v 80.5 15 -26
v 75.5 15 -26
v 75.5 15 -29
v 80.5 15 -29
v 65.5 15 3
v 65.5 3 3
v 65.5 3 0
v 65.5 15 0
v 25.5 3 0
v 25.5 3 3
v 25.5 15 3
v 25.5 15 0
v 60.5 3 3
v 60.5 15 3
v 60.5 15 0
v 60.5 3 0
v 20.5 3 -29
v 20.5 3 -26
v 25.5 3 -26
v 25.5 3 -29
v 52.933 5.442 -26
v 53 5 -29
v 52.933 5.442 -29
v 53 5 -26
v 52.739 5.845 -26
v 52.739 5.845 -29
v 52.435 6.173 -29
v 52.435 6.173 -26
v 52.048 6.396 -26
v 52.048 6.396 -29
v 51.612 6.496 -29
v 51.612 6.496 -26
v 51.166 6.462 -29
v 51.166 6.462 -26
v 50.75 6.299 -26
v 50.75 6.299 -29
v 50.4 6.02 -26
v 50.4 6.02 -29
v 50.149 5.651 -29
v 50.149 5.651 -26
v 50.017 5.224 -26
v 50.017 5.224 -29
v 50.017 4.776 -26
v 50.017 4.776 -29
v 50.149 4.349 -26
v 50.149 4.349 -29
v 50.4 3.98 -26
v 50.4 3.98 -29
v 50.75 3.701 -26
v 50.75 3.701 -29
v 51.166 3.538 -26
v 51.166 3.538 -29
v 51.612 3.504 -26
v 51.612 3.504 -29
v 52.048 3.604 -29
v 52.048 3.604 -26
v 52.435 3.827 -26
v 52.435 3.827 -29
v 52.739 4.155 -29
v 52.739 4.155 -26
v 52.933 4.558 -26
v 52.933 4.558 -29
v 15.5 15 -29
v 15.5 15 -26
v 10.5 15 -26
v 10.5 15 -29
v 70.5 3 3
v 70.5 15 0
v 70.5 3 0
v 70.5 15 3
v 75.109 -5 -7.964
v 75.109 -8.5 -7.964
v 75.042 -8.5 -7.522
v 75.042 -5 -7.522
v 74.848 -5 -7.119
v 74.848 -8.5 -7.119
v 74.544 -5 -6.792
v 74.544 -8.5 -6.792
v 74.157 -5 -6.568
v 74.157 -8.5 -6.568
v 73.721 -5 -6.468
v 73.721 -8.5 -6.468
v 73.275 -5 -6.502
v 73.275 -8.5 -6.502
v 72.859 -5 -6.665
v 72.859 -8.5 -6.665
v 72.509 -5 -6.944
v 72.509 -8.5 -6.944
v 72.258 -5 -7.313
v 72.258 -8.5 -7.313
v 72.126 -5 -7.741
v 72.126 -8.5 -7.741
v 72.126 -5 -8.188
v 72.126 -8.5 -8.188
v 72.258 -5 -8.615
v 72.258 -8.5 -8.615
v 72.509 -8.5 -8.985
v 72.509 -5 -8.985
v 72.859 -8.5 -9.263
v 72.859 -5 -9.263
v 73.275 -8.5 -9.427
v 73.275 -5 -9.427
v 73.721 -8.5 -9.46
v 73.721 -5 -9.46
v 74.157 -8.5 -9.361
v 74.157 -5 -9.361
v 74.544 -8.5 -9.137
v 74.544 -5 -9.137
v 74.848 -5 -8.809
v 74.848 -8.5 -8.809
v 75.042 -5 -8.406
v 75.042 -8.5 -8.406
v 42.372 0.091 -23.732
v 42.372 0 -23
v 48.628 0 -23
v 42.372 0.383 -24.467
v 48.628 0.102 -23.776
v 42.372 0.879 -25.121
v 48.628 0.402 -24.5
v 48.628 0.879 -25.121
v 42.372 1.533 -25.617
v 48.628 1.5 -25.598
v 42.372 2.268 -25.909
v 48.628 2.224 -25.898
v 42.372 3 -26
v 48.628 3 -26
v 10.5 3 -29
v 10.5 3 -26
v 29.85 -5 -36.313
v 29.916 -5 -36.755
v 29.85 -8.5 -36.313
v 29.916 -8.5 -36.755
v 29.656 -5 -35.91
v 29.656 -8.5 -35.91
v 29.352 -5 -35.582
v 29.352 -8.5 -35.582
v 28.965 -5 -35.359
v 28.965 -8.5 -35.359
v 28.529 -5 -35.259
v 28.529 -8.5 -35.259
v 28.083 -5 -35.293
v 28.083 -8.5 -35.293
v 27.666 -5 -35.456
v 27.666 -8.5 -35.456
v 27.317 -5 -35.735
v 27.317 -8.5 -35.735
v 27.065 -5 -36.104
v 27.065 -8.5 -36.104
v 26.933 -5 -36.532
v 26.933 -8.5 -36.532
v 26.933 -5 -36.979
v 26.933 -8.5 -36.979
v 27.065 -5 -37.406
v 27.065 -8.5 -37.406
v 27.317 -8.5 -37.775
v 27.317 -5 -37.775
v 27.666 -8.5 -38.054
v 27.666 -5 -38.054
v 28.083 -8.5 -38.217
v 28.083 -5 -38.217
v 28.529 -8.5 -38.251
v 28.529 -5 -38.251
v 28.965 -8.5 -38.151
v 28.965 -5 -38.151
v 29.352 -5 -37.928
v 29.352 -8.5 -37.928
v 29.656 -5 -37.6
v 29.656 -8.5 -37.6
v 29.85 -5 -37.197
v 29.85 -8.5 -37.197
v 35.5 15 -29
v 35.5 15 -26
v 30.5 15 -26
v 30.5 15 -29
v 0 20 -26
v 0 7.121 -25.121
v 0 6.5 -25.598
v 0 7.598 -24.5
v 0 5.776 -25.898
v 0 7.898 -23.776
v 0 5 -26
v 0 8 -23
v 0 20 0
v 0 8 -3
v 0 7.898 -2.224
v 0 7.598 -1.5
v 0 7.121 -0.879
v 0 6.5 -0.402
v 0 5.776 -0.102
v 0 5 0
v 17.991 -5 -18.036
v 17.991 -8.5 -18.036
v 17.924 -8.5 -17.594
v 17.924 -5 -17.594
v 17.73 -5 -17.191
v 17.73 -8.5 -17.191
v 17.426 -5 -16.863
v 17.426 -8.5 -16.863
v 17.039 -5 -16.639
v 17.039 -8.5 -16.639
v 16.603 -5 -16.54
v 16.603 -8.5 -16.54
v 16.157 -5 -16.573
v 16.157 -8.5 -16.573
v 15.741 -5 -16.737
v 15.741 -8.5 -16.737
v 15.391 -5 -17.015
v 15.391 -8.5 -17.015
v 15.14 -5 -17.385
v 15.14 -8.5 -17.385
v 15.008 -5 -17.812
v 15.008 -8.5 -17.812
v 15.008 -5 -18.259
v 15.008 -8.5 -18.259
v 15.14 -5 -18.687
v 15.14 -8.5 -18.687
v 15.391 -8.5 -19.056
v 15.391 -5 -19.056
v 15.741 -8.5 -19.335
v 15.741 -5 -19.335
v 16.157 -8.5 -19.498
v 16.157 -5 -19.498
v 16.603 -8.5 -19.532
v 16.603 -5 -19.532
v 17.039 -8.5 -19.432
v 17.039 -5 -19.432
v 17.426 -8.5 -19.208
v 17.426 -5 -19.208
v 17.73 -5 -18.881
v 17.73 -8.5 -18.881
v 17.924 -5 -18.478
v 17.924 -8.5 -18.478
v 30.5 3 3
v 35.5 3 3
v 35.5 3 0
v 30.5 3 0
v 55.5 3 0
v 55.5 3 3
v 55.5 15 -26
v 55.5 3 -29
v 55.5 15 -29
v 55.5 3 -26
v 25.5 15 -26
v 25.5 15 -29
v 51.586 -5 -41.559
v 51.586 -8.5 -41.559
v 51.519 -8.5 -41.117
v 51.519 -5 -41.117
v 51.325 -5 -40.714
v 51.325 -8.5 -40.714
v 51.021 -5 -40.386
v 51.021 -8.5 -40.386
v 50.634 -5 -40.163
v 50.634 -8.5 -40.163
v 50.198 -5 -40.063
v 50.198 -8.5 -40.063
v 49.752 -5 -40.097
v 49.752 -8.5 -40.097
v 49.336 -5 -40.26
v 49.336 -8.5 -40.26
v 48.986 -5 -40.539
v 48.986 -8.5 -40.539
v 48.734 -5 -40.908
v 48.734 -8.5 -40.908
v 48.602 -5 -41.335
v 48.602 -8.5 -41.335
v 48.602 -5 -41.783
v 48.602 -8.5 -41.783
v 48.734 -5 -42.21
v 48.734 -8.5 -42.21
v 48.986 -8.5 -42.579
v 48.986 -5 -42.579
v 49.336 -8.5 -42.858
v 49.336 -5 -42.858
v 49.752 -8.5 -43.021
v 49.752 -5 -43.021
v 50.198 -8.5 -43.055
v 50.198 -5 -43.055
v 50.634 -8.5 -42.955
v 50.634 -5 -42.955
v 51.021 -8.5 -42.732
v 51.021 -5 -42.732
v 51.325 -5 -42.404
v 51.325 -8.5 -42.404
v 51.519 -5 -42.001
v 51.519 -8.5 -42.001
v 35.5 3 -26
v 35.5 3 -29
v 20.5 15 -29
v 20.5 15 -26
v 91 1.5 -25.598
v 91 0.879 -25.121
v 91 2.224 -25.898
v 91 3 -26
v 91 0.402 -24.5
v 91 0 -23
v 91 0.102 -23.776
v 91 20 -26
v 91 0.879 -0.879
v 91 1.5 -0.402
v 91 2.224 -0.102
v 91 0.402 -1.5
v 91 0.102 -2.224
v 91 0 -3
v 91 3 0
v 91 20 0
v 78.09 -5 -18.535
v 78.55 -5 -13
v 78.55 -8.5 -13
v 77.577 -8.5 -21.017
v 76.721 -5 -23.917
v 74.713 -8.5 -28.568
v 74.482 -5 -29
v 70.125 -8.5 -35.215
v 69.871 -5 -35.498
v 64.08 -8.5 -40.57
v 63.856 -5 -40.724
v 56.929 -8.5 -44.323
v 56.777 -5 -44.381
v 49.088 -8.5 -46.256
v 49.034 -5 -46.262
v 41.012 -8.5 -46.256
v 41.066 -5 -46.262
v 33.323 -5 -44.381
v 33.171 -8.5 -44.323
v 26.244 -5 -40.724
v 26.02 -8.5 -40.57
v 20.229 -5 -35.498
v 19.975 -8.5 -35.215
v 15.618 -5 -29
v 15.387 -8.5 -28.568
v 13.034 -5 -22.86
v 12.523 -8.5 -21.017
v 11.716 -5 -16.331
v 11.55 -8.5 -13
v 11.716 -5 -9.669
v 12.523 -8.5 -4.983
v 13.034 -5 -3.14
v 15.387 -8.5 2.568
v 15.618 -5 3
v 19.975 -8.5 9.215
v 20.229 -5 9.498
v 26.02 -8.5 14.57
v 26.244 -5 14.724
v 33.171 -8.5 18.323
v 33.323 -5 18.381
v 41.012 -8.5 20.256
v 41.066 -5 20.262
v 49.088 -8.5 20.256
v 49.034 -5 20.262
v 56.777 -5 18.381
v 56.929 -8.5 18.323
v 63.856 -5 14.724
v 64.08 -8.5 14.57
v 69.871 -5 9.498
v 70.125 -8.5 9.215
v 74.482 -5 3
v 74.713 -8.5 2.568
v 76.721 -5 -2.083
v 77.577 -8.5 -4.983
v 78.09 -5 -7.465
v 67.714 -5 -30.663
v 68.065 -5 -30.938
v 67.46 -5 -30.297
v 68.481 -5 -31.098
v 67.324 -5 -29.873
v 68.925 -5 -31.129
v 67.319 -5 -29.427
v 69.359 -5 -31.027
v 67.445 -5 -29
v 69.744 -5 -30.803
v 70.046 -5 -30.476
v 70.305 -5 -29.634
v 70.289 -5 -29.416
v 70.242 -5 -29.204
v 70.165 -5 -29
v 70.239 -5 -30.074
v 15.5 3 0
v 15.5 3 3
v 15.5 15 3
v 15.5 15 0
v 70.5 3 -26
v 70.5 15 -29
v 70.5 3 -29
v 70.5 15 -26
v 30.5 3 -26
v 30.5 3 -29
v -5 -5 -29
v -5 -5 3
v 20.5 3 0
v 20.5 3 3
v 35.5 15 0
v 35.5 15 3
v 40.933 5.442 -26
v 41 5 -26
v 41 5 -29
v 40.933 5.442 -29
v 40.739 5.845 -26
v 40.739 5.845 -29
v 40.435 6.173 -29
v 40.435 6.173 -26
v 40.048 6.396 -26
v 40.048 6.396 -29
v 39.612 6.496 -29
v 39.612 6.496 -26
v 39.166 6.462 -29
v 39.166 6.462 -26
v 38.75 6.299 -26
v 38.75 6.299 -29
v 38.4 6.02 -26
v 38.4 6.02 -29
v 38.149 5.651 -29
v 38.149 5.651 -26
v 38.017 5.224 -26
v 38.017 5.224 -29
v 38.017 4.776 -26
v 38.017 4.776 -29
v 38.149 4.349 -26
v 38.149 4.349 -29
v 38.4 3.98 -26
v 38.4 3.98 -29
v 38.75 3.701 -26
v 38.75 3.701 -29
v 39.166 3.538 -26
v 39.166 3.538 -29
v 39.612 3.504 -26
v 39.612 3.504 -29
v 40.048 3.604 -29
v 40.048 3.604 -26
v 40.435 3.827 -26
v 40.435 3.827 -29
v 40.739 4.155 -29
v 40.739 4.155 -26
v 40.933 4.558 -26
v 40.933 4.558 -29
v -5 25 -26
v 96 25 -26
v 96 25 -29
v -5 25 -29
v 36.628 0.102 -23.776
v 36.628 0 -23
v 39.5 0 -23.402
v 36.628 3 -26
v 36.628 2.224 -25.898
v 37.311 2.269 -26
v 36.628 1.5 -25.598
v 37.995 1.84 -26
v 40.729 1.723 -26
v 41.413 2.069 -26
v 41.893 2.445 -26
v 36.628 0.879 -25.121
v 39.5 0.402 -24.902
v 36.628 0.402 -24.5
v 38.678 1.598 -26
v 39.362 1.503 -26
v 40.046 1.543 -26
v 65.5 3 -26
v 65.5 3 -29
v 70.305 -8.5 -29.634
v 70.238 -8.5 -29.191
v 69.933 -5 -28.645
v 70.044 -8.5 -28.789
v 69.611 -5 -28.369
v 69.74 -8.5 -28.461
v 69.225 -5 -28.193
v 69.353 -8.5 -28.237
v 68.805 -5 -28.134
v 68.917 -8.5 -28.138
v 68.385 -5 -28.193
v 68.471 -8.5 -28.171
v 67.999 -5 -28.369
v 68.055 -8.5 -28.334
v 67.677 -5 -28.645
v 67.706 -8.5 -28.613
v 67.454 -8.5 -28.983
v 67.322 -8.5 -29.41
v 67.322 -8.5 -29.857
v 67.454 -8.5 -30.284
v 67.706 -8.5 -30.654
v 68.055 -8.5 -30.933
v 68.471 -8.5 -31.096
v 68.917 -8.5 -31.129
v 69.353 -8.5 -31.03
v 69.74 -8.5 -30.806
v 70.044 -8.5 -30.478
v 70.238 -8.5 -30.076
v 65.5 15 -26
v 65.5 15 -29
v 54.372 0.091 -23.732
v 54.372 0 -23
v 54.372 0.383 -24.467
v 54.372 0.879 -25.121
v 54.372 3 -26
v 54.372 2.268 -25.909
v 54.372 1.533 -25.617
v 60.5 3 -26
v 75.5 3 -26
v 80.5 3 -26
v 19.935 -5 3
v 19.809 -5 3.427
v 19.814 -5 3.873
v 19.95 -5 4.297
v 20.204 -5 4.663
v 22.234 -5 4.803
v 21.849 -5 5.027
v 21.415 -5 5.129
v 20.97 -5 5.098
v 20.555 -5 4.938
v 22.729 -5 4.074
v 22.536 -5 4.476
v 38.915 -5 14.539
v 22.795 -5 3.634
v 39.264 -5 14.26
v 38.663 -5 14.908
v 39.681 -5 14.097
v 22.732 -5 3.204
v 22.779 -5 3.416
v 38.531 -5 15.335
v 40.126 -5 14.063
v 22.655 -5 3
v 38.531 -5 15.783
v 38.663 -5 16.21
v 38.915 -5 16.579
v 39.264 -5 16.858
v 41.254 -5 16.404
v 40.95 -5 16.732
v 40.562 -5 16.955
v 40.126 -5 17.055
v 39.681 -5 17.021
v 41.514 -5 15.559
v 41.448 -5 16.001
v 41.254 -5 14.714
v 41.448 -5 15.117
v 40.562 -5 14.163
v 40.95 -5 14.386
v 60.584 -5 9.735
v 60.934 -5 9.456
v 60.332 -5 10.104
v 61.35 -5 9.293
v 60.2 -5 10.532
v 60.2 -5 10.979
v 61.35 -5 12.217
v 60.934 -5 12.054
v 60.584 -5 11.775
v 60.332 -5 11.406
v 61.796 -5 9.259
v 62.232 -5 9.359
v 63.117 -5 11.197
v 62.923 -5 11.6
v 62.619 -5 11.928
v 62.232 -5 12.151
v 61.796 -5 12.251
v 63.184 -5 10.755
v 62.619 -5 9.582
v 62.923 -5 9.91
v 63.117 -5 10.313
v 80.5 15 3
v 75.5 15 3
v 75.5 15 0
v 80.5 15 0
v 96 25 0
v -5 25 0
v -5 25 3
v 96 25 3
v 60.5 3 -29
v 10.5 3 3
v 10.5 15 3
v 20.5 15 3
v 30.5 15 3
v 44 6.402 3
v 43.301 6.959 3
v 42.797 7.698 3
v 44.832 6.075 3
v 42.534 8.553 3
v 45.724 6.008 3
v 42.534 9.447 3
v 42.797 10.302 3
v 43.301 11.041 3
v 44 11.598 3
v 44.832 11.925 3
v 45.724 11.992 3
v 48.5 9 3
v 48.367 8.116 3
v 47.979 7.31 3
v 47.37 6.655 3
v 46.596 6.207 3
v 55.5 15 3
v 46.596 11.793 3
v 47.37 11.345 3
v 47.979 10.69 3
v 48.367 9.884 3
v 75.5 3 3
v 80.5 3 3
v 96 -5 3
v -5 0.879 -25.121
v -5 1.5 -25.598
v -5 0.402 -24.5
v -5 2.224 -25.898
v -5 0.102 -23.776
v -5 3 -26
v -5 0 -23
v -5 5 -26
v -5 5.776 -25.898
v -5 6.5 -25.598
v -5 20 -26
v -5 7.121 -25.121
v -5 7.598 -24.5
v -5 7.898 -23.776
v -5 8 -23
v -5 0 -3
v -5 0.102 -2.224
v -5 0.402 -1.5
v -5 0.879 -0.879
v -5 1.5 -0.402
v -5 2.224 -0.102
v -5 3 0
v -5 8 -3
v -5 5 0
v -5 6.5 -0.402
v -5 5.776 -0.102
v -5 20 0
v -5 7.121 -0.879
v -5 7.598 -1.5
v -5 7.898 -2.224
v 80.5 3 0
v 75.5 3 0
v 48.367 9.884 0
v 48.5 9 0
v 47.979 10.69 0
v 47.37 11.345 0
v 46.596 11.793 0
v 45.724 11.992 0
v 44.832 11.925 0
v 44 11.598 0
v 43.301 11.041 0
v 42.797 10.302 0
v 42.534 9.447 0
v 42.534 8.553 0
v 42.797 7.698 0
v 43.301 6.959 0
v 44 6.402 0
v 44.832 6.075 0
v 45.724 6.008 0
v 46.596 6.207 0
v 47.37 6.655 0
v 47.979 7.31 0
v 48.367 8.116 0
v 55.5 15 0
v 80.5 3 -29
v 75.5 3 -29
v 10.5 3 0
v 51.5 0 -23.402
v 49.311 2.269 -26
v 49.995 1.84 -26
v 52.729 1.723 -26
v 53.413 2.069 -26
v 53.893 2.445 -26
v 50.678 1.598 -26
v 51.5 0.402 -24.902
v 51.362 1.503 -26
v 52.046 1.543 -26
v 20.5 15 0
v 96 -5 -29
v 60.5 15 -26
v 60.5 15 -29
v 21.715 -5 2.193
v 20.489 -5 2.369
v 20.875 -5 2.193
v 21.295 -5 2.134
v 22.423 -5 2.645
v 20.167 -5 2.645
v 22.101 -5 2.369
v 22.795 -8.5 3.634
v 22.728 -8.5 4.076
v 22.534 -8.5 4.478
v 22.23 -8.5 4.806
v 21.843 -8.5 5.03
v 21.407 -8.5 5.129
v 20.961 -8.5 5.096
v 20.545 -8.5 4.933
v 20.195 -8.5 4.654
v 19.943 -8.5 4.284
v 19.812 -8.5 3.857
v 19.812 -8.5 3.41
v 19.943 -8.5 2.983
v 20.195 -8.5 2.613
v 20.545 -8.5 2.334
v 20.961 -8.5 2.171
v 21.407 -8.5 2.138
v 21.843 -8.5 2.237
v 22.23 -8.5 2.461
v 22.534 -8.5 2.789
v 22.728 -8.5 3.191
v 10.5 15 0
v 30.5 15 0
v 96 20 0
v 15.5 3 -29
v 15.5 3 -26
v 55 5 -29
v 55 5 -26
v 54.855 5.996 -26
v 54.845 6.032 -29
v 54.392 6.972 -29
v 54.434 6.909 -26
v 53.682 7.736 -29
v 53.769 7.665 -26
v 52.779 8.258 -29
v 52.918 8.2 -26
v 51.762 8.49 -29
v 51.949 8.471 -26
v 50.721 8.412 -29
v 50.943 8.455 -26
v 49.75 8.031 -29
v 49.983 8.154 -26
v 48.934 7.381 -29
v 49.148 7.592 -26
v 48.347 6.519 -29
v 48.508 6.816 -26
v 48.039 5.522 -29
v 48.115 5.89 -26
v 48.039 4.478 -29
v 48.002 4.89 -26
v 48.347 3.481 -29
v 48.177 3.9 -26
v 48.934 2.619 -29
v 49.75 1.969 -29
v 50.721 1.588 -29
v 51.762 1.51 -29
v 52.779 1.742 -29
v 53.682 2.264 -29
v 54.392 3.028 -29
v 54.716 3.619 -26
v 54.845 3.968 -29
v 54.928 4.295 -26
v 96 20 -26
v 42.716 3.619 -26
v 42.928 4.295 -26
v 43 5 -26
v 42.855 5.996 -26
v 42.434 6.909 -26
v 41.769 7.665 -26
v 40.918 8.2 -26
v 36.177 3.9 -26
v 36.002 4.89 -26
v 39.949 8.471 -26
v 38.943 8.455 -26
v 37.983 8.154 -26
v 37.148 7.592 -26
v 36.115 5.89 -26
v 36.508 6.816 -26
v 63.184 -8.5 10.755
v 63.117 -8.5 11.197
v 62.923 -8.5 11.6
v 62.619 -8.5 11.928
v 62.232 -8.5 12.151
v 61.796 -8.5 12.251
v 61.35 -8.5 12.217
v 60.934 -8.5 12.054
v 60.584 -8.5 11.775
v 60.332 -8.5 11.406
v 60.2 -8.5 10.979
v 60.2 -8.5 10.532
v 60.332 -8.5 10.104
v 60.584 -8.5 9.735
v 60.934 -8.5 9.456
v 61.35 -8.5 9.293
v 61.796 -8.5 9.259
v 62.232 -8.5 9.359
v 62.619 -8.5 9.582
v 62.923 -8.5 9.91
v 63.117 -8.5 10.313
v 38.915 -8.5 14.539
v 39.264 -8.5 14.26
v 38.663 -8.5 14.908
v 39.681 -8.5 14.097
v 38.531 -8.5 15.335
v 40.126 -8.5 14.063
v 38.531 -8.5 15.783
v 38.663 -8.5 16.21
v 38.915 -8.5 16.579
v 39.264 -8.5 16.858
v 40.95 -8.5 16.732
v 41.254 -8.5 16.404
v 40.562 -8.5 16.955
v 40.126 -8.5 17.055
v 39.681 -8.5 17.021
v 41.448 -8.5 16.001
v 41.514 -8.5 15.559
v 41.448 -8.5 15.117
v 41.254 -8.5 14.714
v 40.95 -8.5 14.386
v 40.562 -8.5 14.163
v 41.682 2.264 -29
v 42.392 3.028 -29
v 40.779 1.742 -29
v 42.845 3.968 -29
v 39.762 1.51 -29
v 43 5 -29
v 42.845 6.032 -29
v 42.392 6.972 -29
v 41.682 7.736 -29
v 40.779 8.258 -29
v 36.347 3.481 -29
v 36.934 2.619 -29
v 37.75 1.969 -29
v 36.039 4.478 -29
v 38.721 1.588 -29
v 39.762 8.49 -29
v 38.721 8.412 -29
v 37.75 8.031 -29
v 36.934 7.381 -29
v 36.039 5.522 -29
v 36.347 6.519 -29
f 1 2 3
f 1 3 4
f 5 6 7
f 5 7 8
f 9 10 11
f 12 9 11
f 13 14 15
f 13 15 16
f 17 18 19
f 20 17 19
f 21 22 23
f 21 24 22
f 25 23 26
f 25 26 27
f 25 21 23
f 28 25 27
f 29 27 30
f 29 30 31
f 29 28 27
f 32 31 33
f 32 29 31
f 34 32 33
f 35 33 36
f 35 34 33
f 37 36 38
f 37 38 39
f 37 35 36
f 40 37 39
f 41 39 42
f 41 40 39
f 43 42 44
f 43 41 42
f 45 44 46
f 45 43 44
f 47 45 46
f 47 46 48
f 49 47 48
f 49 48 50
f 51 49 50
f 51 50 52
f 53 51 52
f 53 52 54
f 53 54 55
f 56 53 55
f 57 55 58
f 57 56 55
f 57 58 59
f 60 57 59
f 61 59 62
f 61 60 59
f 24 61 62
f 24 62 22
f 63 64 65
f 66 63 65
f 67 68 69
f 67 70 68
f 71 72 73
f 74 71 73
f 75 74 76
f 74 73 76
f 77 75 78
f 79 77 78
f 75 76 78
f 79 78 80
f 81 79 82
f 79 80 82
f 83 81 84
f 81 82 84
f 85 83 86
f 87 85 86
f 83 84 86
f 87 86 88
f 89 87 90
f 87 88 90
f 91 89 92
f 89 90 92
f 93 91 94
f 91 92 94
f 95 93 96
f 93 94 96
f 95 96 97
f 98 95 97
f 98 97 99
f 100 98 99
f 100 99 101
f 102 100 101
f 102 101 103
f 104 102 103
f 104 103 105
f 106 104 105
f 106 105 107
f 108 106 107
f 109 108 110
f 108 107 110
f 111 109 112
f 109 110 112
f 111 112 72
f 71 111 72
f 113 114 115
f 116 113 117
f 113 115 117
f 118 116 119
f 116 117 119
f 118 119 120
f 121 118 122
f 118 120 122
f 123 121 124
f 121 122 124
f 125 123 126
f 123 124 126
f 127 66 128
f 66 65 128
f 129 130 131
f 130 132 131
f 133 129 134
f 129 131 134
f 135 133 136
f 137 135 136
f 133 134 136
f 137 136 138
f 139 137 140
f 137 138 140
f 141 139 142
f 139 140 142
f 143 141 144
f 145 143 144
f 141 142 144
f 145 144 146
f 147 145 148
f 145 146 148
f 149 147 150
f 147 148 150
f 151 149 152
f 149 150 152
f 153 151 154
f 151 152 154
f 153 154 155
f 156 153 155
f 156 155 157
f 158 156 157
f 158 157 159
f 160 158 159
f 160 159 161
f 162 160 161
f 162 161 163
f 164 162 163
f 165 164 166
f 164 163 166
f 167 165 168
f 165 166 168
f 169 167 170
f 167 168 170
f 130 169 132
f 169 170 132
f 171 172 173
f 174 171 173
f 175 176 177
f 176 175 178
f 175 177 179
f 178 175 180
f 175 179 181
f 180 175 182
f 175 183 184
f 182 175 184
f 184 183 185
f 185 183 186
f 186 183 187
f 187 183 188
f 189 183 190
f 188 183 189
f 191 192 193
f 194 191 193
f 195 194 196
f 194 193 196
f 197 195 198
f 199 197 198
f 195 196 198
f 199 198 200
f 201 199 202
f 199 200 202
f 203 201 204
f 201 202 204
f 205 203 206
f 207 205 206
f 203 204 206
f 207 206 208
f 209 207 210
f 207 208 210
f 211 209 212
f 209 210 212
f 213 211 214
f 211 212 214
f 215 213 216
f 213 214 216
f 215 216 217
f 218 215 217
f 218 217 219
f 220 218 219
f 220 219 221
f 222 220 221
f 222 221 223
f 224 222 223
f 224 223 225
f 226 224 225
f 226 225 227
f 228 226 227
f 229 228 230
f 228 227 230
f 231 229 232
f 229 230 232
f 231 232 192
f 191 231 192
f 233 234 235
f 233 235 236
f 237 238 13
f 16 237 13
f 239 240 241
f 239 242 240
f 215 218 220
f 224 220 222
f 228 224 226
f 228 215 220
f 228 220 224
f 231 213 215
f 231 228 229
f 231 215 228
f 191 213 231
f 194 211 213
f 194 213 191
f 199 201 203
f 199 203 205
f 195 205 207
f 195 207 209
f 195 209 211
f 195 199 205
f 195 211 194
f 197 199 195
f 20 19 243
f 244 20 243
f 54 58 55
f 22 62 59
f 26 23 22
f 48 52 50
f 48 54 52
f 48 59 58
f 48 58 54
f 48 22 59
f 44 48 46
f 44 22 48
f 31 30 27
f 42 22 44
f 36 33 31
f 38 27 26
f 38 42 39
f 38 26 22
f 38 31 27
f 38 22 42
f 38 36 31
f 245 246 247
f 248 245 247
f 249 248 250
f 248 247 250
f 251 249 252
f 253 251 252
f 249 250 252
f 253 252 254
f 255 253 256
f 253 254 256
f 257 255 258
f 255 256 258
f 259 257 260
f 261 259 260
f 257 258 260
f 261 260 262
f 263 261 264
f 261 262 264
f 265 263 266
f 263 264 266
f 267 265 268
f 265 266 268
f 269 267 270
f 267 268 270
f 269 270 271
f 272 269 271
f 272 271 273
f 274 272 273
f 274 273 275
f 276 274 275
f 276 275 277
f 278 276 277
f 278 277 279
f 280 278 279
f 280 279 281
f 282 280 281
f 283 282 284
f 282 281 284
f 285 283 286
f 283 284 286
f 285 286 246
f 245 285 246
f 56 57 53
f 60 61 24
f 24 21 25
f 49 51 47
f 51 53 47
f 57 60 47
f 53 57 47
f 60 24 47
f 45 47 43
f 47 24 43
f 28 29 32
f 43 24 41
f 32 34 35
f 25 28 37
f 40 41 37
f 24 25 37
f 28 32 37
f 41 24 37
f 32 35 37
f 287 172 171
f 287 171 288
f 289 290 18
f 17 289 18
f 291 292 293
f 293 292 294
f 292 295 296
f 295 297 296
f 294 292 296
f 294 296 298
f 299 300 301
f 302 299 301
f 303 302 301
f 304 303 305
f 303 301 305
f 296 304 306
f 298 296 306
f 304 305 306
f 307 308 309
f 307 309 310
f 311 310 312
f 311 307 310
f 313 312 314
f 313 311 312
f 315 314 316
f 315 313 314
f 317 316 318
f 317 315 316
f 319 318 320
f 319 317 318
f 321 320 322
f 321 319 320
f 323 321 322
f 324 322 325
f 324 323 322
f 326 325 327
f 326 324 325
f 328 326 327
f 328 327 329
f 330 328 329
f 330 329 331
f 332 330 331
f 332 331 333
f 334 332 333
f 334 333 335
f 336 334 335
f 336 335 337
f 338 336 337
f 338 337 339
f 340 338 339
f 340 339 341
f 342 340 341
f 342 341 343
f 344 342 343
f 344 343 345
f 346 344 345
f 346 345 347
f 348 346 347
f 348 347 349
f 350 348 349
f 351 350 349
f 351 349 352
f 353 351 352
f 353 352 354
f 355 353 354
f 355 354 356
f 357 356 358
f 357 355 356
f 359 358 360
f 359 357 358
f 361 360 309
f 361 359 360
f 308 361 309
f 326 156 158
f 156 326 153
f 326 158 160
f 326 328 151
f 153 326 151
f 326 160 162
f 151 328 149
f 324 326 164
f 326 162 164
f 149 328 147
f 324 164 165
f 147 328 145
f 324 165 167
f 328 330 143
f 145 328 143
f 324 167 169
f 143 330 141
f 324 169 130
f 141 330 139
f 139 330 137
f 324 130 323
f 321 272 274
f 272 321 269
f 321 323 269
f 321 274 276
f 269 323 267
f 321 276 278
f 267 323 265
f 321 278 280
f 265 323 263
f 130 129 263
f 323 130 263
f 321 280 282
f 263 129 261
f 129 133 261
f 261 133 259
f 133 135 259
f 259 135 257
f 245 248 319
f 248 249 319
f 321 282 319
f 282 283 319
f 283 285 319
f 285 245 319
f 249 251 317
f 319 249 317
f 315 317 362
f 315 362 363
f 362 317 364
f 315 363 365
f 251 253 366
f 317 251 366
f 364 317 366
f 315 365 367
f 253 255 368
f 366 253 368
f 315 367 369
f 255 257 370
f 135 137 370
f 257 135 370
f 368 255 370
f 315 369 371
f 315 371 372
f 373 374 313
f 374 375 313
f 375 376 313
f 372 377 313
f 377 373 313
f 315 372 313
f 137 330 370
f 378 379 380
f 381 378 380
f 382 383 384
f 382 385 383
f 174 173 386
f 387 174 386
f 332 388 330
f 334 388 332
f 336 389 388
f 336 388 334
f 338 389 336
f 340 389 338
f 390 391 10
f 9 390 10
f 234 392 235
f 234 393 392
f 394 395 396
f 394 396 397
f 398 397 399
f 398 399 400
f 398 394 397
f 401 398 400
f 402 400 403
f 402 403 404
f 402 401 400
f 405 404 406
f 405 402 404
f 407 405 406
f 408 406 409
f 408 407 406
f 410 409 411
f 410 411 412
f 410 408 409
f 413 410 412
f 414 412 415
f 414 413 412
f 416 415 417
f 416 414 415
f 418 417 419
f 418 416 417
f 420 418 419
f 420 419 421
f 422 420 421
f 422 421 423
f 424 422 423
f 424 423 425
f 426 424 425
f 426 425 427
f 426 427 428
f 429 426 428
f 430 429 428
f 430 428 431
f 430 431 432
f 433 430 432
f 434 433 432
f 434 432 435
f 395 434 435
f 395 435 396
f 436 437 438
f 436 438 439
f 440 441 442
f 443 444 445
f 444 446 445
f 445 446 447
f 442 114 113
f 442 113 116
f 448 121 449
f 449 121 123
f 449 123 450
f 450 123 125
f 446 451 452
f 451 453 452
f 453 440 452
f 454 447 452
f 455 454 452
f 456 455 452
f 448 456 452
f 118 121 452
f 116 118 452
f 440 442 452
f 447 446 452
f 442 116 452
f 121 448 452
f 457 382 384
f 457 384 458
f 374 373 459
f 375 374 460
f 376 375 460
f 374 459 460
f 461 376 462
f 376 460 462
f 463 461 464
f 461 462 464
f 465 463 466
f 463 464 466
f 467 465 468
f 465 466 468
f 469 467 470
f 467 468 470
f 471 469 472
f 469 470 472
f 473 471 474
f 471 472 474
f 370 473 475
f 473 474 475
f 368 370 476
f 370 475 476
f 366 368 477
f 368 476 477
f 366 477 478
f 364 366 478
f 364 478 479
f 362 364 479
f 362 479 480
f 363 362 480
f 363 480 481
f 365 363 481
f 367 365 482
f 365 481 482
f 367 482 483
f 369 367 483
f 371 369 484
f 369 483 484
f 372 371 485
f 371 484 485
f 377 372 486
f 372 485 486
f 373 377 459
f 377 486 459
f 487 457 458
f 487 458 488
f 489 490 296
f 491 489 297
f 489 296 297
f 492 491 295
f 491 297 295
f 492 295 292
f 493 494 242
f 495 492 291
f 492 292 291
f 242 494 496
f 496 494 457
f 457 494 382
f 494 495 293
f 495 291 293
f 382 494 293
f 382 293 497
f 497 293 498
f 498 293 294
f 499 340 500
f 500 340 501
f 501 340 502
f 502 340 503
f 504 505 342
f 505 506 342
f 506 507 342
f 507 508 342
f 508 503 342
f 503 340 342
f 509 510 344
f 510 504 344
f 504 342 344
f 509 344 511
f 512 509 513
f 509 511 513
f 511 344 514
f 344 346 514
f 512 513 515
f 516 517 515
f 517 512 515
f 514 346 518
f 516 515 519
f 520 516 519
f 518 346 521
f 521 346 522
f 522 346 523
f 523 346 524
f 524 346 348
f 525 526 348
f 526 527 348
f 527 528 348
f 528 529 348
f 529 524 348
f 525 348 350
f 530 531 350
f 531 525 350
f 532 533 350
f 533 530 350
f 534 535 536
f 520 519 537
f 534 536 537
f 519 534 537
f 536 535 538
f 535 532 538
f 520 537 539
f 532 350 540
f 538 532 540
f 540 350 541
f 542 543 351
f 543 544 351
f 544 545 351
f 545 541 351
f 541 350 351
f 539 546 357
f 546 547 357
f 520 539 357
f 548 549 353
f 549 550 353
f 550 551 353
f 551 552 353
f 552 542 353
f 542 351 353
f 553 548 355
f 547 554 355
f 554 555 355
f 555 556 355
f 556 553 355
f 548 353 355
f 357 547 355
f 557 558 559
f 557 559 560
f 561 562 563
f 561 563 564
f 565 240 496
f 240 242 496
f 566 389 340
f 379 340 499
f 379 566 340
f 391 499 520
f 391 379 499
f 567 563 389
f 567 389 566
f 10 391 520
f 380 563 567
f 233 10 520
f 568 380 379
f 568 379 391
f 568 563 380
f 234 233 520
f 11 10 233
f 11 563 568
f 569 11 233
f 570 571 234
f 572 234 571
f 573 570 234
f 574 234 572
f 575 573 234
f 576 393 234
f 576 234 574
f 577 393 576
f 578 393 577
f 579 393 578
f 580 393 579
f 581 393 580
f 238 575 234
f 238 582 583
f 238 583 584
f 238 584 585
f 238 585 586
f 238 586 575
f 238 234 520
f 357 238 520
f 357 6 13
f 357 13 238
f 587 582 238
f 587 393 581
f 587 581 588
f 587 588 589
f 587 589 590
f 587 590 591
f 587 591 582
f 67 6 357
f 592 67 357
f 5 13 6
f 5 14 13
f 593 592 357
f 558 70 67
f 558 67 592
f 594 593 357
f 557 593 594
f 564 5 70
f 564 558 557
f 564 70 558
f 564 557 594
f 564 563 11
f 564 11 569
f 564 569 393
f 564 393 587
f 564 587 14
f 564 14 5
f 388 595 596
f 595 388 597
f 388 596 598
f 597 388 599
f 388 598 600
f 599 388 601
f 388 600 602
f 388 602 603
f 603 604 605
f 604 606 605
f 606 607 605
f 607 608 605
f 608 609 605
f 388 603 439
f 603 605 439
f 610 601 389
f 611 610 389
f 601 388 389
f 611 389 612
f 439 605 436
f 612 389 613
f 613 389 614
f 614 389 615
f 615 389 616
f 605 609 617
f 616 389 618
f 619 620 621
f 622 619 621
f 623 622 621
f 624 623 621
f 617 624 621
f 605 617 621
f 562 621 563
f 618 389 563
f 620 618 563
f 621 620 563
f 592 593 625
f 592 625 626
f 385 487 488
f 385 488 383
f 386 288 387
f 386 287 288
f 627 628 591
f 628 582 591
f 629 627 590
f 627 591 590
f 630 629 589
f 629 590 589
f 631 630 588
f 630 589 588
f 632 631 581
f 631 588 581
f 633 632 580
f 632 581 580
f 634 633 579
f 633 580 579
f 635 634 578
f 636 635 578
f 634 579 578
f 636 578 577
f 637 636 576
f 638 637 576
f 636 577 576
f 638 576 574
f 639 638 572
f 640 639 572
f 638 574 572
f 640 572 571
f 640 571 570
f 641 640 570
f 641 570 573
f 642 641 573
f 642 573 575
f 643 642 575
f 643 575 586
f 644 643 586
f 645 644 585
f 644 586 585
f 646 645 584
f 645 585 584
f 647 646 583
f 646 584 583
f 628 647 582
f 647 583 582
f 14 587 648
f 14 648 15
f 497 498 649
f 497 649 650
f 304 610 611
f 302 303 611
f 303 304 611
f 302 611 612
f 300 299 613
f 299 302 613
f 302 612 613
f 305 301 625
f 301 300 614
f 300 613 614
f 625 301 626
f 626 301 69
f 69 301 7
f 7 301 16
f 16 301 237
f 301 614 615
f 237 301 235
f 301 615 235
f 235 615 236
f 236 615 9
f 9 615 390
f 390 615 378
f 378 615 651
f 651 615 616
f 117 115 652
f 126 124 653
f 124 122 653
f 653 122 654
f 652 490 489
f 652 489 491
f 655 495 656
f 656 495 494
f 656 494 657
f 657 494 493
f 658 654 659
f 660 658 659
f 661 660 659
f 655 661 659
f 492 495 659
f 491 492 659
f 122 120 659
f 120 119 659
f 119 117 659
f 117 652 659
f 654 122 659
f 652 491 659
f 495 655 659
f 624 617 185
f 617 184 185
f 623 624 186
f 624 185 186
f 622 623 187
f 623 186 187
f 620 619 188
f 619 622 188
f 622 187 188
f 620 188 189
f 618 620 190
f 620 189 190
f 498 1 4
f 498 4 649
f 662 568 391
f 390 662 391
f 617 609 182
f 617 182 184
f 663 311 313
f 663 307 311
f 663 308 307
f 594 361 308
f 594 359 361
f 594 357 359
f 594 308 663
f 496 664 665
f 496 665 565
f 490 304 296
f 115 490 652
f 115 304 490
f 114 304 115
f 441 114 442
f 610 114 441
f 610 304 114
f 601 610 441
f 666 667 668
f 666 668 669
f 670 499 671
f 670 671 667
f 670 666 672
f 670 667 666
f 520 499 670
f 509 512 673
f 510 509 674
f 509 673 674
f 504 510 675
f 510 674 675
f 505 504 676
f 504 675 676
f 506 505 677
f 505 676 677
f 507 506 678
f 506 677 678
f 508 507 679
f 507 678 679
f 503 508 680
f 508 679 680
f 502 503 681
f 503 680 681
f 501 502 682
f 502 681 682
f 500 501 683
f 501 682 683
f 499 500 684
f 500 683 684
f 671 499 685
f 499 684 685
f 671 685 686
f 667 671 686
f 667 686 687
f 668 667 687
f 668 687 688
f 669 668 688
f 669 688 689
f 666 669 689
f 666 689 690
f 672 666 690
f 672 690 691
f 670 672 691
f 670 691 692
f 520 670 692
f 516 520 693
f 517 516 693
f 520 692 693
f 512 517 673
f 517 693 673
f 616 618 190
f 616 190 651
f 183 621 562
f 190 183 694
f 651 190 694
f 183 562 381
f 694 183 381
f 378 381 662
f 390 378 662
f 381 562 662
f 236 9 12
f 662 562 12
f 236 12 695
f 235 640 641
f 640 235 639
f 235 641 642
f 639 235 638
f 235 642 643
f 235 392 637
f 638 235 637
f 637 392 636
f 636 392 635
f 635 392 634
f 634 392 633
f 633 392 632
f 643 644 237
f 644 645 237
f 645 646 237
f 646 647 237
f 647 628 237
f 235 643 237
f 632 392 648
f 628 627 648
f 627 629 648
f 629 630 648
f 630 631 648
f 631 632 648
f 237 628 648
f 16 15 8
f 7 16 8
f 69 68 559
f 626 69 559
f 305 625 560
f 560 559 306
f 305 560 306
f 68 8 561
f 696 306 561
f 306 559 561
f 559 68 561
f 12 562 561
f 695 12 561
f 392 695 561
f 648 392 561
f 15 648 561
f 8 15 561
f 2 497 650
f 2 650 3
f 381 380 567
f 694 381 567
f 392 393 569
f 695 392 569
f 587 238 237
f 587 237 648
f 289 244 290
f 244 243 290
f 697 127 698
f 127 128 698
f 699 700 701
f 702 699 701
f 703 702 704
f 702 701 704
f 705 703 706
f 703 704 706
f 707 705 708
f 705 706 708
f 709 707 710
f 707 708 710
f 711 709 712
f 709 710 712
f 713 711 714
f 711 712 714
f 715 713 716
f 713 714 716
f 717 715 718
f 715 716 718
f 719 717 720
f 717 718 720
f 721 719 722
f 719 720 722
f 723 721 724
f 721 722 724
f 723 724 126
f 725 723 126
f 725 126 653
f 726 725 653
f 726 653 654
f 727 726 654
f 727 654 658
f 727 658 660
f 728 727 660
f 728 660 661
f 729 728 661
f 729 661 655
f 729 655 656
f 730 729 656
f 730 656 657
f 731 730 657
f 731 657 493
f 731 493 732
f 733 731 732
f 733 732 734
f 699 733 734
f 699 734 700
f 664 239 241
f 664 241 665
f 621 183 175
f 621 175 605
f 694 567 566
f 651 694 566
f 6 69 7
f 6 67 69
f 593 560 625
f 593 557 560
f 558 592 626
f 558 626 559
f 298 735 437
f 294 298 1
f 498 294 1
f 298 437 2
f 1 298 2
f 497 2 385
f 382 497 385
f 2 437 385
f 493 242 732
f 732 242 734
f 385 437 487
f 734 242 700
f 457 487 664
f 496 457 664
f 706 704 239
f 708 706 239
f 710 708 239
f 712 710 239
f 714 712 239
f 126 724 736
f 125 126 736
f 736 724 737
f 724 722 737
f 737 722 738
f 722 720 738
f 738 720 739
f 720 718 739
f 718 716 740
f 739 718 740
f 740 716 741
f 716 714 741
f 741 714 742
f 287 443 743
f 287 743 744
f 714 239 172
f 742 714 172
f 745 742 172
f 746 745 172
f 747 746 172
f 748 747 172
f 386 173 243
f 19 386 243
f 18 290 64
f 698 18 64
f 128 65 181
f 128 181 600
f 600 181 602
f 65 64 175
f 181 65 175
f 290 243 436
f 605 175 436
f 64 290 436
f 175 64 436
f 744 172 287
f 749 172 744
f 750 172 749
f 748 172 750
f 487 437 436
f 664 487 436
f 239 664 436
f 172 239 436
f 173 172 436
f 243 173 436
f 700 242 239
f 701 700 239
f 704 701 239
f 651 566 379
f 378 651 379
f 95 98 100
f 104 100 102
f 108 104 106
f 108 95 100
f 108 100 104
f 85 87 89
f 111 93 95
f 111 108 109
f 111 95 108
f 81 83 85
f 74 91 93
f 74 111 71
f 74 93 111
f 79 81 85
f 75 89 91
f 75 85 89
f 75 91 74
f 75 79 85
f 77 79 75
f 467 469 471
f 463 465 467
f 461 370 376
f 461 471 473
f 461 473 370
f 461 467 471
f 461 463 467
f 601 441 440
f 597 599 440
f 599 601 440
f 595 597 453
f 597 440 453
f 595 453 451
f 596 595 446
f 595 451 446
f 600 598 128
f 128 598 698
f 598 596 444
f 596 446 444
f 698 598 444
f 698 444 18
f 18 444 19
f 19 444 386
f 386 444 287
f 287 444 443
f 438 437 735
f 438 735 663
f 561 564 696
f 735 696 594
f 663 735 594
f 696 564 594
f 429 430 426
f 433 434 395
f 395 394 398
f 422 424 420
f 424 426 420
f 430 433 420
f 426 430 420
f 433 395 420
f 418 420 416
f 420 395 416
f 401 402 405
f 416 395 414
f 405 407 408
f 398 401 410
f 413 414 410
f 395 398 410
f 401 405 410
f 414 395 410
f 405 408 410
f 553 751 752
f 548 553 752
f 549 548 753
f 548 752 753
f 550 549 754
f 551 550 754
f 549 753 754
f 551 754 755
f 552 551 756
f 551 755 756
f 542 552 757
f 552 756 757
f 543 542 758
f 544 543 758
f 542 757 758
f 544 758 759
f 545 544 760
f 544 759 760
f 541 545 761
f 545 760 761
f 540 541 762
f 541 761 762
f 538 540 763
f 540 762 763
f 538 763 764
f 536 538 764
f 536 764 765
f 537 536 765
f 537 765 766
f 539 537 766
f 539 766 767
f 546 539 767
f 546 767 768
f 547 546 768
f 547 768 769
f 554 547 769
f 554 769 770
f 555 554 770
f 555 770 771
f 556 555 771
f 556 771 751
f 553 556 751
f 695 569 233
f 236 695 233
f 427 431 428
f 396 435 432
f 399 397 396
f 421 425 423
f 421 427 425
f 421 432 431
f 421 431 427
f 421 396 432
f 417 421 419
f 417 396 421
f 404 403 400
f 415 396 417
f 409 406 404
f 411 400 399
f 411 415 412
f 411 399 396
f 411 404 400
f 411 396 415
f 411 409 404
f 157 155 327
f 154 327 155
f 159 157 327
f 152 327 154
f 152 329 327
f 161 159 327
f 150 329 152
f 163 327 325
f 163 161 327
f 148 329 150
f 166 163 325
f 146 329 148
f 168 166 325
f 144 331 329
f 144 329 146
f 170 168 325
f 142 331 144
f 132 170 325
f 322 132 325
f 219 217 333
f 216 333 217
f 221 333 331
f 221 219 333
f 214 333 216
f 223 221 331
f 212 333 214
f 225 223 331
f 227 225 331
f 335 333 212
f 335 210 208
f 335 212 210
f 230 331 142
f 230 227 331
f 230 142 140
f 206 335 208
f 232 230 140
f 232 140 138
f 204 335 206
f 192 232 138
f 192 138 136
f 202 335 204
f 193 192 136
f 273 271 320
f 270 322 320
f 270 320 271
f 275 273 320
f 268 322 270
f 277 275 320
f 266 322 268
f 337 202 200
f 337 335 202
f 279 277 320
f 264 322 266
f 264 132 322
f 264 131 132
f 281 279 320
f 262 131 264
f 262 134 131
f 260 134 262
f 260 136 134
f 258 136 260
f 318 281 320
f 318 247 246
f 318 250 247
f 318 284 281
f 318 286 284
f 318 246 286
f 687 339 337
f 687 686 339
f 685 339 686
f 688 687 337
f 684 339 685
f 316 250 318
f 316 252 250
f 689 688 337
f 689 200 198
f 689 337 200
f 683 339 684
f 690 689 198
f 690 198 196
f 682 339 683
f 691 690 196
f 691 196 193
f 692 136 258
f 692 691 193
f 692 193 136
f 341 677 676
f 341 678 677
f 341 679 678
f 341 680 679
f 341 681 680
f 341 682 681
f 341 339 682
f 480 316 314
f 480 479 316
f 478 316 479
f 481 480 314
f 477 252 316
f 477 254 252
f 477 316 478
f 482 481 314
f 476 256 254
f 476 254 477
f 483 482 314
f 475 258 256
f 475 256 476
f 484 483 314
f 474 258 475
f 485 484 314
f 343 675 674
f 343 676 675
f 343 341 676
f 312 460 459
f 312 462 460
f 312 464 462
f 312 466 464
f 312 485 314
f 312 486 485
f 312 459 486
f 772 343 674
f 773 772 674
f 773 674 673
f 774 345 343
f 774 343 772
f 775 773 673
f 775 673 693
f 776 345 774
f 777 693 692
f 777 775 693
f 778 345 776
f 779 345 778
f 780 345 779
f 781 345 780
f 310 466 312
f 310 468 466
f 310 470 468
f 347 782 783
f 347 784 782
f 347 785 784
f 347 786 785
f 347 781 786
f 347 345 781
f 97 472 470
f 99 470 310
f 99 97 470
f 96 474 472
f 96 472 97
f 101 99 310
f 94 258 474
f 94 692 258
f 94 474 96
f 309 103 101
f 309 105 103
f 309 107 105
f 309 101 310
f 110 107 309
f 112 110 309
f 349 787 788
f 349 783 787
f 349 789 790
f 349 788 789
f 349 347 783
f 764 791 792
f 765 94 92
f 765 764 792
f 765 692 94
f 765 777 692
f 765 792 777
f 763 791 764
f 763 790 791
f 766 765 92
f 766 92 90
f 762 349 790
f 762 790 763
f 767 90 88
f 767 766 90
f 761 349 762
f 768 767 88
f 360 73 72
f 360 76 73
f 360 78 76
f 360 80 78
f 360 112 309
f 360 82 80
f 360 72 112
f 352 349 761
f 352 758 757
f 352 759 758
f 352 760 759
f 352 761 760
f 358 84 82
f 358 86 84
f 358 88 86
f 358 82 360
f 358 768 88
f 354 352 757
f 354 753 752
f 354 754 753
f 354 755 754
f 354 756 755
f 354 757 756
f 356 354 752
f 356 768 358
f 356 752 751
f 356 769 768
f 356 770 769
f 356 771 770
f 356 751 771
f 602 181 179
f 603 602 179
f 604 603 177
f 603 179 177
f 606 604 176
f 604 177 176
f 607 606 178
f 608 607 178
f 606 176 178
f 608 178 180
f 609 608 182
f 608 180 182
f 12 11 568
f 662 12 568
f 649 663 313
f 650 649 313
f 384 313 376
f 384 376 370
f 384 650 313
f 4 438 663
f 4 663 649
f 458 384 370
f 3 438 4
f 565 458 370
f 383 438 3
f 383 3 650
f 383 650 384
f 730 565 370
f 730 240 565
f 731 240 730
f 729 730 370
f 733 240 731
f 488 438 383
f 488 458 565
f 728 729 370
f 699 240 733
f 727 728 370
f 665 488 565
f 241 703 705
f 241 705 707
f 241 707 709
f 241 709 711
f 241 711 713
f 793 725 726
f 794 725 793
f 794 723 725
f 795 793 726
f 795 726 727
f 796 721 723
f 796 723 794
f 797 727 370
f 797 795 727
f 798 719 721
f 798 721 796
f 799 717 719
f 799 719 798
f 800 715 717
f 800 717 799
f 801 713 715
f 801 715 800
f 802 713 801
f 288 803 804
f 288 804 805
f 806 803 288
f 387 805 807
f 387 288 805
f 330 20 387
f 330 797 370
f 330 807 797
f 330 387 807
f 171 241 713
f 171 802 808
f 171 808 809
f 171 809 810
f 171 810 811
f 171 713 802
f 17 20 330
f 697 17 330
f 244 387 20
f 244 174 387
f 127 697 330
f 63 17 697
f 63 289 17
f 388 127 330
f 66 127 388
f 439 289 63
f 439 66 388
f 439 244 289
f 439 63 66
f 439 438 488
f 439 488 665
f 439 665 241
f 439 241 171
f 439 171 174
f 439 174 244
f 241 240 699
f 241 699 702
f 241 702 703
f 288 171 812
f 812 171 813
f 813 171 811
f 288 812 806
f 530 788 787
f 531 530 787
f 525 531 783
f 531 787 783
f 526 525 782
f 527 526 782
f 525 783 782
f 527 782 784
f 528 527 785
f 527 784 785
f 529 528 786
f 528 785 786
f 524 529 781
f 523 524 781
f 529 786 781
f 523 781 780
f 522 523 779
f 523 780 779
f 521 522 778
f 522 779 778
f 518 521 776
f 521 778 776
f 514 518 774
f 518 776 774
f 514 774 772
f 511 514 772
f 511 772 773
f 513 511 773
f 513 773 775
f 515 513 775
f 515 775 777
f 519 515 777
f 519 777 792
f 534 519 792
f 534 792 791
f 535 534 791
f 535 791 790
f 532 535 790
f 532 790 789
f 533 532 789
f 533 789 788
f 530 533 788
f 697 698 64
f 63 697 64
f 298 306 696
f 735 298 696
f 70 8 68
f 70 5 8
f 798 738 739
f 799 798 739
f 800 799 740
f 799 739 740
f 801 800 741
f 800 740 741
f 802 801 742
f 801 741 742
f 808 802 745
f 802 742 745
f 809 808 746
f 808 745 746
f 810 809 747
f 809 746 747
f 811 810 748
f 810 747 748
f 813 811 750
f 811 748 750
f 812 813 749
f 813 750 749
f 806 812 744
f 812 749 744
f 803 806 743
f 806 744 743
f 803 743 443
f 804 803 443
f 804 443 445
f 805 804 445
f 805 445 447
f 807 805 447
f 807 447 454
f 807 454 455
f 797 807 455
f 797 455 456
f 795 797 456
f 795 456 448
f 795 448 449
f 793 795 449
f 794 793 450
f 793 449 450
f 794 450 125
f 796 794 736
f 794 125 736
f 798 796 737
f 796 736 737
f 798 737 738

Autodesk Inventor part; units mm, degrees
ref_plane "YZ Plane" through (0, 0, 0) normal (1, 0, 0) x (0, 1, 0)
ref_plane "XZ Plane" through (0, 0, 0) normal (0, 1, 0) x (-1, 0, 0)
ref_plane "XY Plane" through (0, 0, 0) normal (0, 0, 1) x (1, 0, 0)
sketch "Sketch1" plane through (0, 0, 0) normal (0, 0, 1) x (1, 0, 0)
  line L0 (0, 0) -> (91, 0)
  line L1 (91, 0) -> (91, 20)
  line L2 (91, 20) -> (0, 20)
  line L3 (0, 20) -> (0, 0)
  line L4 (-5, 25) -> (96, 25)
  line L5 (96, 25) -> (96, -5)
  line L6 (96, -5) -> (-5, -5)
  line L7 (-5, -5) -> (-5, 25)
  line L8 (0, 20) -> (-5, 20)
  line L9 (91, 20) -> (96, 20)
  dimension "d0" = 91
  dimension "d1" = 20
  dimension "d2" = 91
  dimension "d3" = 5
extrude "Extrusion1" add sketch "Sketch1" along normal blind 3
extrude "Extrusion2" add sketch "Sketch1" against normal blind 26 contours L0 L1 L9 L5 L6 L7 L8 L3
sketch "Sketch2" plane through (0, 0, -26) normal (0, 0, -1) x (-1, 0, 0)
  line L0 (5, -5) -> (-96, -5) projected
  line L1 (-96, 25) -> (5, 25) projected
  line L2 (-96, -5) -> (5, -5)
  line L3 (5, -5) -> (5, 25)
  line L4 (5, 25) -> (-96, 25)
  line L5 (-96, 25) -> (-96, -5)
  point P0 (0, 0)
extrude "Extrusion3" add sketch "Sketch2" along normal blind 3
sketch "Sketch3" plane through (0, 0, 3) normal (0, 0, 1) x (1, 0, 0)
  line L0 (91, 0) -> (0, 0) projected
  line L1 (45.5, 0) -> (45.5, 9)
  circle A0 centre (45.5, 9) radius 3
  dimension "d10" = 9
  dimension "d11" = 6
extrude "Extrusion4" cut sketch "Sketch3" against normal blind 3
sketch "Sketch6" plane through (-5, -5, 3) normal (0, -1, 0) x (1, 0, 0)
  line L0 (0, -32) -> (101, -32) projected
  line L1 (50.5, -32) -> (50.5, -52)
  line L2 (50.5, -52) -> (56.5, -52)
  line L3 (56.5, -52) -> (56.5, -53.5)
  line L4 (56.5, -53.5) -> (54, -53.5)
  line L5 (54, -53.5) -> (54, -50.5)
  line L6 (54, -50.5) -> (59, -50.5)
  line L7 (59, -50.5) -> (59, -53.5)
  line L8 (59, -53.5) -> (56.5, -53.5)
  line L9 (50.5, -52) -> (44.5, -52)
  line L10 (44.5, -52) -> (44.5, -53.5)
  line L11 (44.5, -53.5) -> (47, -53.5)
  line L12 (47, -53.5) -> (47, -50.5)
  line L13 (47, -50.5) -> (42, -50.5)
  line L14 (42, -50.5) -> (42, -53.5)
  line L15 (42, -53.5) -> (44.5, -53.5)
  point P0 (5, -3)
  dimension "d23" = 20
  dimension "d25" = 6
  dimension "d26" = 1.5
  dimension "d27" = 2.5
  dimension "d28" = 3
  dimension "d29" = 5
extrude "Extrusion7" cut sketch "Sketch6" against normal through all
sketch "Sketch7" plane through (0, 0, -26) normal (0, 0, 1) x (1, 0, 0)
  circle A0 centre (39.5, 5) radius 1.5 projected
  circle A1 centre (39.5, 5) radius 3.5
  circle A2 centre (51.5, 5) radius 1.5 projected
  circle A3 centre (51.5, 5) radius 3.5
  dimension "d32" = 7
  dimension "d33" = 7
extrude "Extrusion8" cut sketch "Sketch7" against normal blind 10
sketch "Sketch8" plane through (-5, -5, 3) normal (-1, 0, 0) x (0, 0, 1)
  line L0 (-3, 5) -> (-3, 25) projected
  line L1 (-3, 5) -> (-29, 5)
  line L2 (-29, 5) -> (-29, 13)
  line L3 (-29, 13) -> (-3, 13)
  line L4 (-3, 13) -> (-3, 5)
  dimension "d37" = 26
  dimension "d38" = 8
extrude "Extrusion9" cut sketch "Sketch8" against normal up to surface (5 mm away)
fillet "Fillet2" radius 3 4 edges at (-2.5, 8, 0) (43, 0, 0) (-2.5, 8, -26) (43, 0, -26)
sketch "Sketch9" plane through (0, 0, 3) normal (0, 0, 1) x (1, 0, 0)
  circle A0 centre (45.5, 9) radius 3 projected
  line L0 (45.5, 9) -> (35.5, 9)
  line L1 (35.5, 9) -> (35.5, 15)
  line L2 (35.5, 15) -> (30.5, 15)
  line L3 (30.5, 15) -> (30.5, 3)
  line L4 (35.5, 9) -> (35.5, 3)
  line L5 (35.5, 3) -> (30.5, 3)
  line L6 (30.5, 9) -> (25.5, 9)
  line L7 (25.5, 9) -> (25.5, 15)
  line L8 (25.5, 15) -> (20.5, 15)
  line L9 (20.5, 15) -> (20.5, 3)
  line L10 (20.5, 3) -> (25.5, 3)
  line L11 (25.5, 3) -> (25.5, 9)
  line L12 (20.5, 9) -> (15.5, 9)
  line L13 (15.5, 9) -> (15.5, 15)
  line L14 (15.5, 15) -> (10.5, 15)
  line L15 (10.5, 15) -> (10.5, 3)
  line L16 (10.5, 3) -> (15.5, 3)
  line L17 (15.5, 3) -> (15.5, 9)
  line L18 (45.5, 9) -> (45.5, 56.359)
  line L19 (45.5, 9) -> (55.5, 9)
  line L20 (55.5, 9) -> (55.5, 15)
  line L21 (55.5, 15) -> (60.5, 15)
  line L22 (60.5, 15) -> (60.5, 3)
  line L23 (55.5, 9) -> (55.5, 3)
  line L24 (55.5, 3) -> (60.5, 3)
  line L25 (60.5, 9) -> (65.5, 9)
  line L26 (65.5, 9) -> (65.5, 15)
  line L27 (65.5, 15) -> (70.5, 15)
  line L28 (70.5, 15) -> (70.5, 3)
  line L29 (70.5, 3) -> (65.5, 3)
  line L30 (65.5, 3) -> (65.5, 9)
  line L31 (70.5, 9) -> (75.5, 9)
  line L32 (75.5, 9) -> (75.5, 15)
  line L33 (75.5, 15) -> (80.5, 15)
  line L34 (80.5, 15) -> (80.5, 3)
  line L35 (80.5, 3) -> (75.5, 3)
  line L36 (75.5, 3) -> (75.5, 9)
  point P0 (0, 0)
  point P1 (91, 0)
  dimension "d42" = 10
  dimension "d43" = 6
  dimension "d44" = 5
  dimension "d45" = 12
  dimension "d46" = 6
  dimension "d47" = 5
  dimension "d48" = 6
  dimension "d49" = 5
  dimension "d50" = 12
  dimension "d51" = 5
  dimension "d52" = 5
  dimension "d53" = 6
  dimension "d54" = 5
  dimension "d55" = 12
  dimension "d56" = 5
extrude "Extrusion10" cut sketch "Sketch9" against normal through all contours L17 L16 L15 L14 L13 | L11 L10 L9 L8 L7 | L4 L5 L3 L2 L1 | L32 L33 L34 L35 L36 | L26 L27 L28 L29 L30 | L20 L21 L22 L24 L23
sketch "Sketch12" plane through (-5, -5, 3) normal (0, -1, 0) x (1, 0, 0)
  circle A0 centre (50.05, -16) radius 33.5
  line L0 (0, 0) -> (0, -32) projected
  line L1 (0, 0) -> (101, 0) projected
  point P0 (5, -3)
  dimension "d67" = 67
  dimension "d68" = 50.05
  dimension "d69" = 16
extrude "Extrusion12" add sketch "Sketch12" along normal blind 3.5
sketch "Sketch14" plane through (45.05, -8.5, -13) normal (0, -1, 0) x (1, 0, 0)
  circle A0 centre (5.0357, -28.559) radius 1.5
  circle A1 centre (23.7551, -16.6335) radius 1.5
  circle A2 centre (28.559, 5.0357) radius 1.5
  circle A3 centre (16.6335, 23.7551) radius 1.5
  circle A4 centre (-5.0357, 28.559) radius 1.5
  circle A5 centre (-23.7551, 16.6335) radius 1.5
  circle A6 centre (-28.559, -5.0357) radius 1.5
  circle A7 centre (-16.6335, -23.7551) radius 1.5
  point P0 (-45.05, 13)
  point P1 (0, 0)
  dimension "d82" = 3
  dimension "d86" = 360
extrude "Extrusion14" cut sketch "Sketch14" against normal blind 3.5
equation "\"d2\" = d0"
properties part number "realsense_circle"
